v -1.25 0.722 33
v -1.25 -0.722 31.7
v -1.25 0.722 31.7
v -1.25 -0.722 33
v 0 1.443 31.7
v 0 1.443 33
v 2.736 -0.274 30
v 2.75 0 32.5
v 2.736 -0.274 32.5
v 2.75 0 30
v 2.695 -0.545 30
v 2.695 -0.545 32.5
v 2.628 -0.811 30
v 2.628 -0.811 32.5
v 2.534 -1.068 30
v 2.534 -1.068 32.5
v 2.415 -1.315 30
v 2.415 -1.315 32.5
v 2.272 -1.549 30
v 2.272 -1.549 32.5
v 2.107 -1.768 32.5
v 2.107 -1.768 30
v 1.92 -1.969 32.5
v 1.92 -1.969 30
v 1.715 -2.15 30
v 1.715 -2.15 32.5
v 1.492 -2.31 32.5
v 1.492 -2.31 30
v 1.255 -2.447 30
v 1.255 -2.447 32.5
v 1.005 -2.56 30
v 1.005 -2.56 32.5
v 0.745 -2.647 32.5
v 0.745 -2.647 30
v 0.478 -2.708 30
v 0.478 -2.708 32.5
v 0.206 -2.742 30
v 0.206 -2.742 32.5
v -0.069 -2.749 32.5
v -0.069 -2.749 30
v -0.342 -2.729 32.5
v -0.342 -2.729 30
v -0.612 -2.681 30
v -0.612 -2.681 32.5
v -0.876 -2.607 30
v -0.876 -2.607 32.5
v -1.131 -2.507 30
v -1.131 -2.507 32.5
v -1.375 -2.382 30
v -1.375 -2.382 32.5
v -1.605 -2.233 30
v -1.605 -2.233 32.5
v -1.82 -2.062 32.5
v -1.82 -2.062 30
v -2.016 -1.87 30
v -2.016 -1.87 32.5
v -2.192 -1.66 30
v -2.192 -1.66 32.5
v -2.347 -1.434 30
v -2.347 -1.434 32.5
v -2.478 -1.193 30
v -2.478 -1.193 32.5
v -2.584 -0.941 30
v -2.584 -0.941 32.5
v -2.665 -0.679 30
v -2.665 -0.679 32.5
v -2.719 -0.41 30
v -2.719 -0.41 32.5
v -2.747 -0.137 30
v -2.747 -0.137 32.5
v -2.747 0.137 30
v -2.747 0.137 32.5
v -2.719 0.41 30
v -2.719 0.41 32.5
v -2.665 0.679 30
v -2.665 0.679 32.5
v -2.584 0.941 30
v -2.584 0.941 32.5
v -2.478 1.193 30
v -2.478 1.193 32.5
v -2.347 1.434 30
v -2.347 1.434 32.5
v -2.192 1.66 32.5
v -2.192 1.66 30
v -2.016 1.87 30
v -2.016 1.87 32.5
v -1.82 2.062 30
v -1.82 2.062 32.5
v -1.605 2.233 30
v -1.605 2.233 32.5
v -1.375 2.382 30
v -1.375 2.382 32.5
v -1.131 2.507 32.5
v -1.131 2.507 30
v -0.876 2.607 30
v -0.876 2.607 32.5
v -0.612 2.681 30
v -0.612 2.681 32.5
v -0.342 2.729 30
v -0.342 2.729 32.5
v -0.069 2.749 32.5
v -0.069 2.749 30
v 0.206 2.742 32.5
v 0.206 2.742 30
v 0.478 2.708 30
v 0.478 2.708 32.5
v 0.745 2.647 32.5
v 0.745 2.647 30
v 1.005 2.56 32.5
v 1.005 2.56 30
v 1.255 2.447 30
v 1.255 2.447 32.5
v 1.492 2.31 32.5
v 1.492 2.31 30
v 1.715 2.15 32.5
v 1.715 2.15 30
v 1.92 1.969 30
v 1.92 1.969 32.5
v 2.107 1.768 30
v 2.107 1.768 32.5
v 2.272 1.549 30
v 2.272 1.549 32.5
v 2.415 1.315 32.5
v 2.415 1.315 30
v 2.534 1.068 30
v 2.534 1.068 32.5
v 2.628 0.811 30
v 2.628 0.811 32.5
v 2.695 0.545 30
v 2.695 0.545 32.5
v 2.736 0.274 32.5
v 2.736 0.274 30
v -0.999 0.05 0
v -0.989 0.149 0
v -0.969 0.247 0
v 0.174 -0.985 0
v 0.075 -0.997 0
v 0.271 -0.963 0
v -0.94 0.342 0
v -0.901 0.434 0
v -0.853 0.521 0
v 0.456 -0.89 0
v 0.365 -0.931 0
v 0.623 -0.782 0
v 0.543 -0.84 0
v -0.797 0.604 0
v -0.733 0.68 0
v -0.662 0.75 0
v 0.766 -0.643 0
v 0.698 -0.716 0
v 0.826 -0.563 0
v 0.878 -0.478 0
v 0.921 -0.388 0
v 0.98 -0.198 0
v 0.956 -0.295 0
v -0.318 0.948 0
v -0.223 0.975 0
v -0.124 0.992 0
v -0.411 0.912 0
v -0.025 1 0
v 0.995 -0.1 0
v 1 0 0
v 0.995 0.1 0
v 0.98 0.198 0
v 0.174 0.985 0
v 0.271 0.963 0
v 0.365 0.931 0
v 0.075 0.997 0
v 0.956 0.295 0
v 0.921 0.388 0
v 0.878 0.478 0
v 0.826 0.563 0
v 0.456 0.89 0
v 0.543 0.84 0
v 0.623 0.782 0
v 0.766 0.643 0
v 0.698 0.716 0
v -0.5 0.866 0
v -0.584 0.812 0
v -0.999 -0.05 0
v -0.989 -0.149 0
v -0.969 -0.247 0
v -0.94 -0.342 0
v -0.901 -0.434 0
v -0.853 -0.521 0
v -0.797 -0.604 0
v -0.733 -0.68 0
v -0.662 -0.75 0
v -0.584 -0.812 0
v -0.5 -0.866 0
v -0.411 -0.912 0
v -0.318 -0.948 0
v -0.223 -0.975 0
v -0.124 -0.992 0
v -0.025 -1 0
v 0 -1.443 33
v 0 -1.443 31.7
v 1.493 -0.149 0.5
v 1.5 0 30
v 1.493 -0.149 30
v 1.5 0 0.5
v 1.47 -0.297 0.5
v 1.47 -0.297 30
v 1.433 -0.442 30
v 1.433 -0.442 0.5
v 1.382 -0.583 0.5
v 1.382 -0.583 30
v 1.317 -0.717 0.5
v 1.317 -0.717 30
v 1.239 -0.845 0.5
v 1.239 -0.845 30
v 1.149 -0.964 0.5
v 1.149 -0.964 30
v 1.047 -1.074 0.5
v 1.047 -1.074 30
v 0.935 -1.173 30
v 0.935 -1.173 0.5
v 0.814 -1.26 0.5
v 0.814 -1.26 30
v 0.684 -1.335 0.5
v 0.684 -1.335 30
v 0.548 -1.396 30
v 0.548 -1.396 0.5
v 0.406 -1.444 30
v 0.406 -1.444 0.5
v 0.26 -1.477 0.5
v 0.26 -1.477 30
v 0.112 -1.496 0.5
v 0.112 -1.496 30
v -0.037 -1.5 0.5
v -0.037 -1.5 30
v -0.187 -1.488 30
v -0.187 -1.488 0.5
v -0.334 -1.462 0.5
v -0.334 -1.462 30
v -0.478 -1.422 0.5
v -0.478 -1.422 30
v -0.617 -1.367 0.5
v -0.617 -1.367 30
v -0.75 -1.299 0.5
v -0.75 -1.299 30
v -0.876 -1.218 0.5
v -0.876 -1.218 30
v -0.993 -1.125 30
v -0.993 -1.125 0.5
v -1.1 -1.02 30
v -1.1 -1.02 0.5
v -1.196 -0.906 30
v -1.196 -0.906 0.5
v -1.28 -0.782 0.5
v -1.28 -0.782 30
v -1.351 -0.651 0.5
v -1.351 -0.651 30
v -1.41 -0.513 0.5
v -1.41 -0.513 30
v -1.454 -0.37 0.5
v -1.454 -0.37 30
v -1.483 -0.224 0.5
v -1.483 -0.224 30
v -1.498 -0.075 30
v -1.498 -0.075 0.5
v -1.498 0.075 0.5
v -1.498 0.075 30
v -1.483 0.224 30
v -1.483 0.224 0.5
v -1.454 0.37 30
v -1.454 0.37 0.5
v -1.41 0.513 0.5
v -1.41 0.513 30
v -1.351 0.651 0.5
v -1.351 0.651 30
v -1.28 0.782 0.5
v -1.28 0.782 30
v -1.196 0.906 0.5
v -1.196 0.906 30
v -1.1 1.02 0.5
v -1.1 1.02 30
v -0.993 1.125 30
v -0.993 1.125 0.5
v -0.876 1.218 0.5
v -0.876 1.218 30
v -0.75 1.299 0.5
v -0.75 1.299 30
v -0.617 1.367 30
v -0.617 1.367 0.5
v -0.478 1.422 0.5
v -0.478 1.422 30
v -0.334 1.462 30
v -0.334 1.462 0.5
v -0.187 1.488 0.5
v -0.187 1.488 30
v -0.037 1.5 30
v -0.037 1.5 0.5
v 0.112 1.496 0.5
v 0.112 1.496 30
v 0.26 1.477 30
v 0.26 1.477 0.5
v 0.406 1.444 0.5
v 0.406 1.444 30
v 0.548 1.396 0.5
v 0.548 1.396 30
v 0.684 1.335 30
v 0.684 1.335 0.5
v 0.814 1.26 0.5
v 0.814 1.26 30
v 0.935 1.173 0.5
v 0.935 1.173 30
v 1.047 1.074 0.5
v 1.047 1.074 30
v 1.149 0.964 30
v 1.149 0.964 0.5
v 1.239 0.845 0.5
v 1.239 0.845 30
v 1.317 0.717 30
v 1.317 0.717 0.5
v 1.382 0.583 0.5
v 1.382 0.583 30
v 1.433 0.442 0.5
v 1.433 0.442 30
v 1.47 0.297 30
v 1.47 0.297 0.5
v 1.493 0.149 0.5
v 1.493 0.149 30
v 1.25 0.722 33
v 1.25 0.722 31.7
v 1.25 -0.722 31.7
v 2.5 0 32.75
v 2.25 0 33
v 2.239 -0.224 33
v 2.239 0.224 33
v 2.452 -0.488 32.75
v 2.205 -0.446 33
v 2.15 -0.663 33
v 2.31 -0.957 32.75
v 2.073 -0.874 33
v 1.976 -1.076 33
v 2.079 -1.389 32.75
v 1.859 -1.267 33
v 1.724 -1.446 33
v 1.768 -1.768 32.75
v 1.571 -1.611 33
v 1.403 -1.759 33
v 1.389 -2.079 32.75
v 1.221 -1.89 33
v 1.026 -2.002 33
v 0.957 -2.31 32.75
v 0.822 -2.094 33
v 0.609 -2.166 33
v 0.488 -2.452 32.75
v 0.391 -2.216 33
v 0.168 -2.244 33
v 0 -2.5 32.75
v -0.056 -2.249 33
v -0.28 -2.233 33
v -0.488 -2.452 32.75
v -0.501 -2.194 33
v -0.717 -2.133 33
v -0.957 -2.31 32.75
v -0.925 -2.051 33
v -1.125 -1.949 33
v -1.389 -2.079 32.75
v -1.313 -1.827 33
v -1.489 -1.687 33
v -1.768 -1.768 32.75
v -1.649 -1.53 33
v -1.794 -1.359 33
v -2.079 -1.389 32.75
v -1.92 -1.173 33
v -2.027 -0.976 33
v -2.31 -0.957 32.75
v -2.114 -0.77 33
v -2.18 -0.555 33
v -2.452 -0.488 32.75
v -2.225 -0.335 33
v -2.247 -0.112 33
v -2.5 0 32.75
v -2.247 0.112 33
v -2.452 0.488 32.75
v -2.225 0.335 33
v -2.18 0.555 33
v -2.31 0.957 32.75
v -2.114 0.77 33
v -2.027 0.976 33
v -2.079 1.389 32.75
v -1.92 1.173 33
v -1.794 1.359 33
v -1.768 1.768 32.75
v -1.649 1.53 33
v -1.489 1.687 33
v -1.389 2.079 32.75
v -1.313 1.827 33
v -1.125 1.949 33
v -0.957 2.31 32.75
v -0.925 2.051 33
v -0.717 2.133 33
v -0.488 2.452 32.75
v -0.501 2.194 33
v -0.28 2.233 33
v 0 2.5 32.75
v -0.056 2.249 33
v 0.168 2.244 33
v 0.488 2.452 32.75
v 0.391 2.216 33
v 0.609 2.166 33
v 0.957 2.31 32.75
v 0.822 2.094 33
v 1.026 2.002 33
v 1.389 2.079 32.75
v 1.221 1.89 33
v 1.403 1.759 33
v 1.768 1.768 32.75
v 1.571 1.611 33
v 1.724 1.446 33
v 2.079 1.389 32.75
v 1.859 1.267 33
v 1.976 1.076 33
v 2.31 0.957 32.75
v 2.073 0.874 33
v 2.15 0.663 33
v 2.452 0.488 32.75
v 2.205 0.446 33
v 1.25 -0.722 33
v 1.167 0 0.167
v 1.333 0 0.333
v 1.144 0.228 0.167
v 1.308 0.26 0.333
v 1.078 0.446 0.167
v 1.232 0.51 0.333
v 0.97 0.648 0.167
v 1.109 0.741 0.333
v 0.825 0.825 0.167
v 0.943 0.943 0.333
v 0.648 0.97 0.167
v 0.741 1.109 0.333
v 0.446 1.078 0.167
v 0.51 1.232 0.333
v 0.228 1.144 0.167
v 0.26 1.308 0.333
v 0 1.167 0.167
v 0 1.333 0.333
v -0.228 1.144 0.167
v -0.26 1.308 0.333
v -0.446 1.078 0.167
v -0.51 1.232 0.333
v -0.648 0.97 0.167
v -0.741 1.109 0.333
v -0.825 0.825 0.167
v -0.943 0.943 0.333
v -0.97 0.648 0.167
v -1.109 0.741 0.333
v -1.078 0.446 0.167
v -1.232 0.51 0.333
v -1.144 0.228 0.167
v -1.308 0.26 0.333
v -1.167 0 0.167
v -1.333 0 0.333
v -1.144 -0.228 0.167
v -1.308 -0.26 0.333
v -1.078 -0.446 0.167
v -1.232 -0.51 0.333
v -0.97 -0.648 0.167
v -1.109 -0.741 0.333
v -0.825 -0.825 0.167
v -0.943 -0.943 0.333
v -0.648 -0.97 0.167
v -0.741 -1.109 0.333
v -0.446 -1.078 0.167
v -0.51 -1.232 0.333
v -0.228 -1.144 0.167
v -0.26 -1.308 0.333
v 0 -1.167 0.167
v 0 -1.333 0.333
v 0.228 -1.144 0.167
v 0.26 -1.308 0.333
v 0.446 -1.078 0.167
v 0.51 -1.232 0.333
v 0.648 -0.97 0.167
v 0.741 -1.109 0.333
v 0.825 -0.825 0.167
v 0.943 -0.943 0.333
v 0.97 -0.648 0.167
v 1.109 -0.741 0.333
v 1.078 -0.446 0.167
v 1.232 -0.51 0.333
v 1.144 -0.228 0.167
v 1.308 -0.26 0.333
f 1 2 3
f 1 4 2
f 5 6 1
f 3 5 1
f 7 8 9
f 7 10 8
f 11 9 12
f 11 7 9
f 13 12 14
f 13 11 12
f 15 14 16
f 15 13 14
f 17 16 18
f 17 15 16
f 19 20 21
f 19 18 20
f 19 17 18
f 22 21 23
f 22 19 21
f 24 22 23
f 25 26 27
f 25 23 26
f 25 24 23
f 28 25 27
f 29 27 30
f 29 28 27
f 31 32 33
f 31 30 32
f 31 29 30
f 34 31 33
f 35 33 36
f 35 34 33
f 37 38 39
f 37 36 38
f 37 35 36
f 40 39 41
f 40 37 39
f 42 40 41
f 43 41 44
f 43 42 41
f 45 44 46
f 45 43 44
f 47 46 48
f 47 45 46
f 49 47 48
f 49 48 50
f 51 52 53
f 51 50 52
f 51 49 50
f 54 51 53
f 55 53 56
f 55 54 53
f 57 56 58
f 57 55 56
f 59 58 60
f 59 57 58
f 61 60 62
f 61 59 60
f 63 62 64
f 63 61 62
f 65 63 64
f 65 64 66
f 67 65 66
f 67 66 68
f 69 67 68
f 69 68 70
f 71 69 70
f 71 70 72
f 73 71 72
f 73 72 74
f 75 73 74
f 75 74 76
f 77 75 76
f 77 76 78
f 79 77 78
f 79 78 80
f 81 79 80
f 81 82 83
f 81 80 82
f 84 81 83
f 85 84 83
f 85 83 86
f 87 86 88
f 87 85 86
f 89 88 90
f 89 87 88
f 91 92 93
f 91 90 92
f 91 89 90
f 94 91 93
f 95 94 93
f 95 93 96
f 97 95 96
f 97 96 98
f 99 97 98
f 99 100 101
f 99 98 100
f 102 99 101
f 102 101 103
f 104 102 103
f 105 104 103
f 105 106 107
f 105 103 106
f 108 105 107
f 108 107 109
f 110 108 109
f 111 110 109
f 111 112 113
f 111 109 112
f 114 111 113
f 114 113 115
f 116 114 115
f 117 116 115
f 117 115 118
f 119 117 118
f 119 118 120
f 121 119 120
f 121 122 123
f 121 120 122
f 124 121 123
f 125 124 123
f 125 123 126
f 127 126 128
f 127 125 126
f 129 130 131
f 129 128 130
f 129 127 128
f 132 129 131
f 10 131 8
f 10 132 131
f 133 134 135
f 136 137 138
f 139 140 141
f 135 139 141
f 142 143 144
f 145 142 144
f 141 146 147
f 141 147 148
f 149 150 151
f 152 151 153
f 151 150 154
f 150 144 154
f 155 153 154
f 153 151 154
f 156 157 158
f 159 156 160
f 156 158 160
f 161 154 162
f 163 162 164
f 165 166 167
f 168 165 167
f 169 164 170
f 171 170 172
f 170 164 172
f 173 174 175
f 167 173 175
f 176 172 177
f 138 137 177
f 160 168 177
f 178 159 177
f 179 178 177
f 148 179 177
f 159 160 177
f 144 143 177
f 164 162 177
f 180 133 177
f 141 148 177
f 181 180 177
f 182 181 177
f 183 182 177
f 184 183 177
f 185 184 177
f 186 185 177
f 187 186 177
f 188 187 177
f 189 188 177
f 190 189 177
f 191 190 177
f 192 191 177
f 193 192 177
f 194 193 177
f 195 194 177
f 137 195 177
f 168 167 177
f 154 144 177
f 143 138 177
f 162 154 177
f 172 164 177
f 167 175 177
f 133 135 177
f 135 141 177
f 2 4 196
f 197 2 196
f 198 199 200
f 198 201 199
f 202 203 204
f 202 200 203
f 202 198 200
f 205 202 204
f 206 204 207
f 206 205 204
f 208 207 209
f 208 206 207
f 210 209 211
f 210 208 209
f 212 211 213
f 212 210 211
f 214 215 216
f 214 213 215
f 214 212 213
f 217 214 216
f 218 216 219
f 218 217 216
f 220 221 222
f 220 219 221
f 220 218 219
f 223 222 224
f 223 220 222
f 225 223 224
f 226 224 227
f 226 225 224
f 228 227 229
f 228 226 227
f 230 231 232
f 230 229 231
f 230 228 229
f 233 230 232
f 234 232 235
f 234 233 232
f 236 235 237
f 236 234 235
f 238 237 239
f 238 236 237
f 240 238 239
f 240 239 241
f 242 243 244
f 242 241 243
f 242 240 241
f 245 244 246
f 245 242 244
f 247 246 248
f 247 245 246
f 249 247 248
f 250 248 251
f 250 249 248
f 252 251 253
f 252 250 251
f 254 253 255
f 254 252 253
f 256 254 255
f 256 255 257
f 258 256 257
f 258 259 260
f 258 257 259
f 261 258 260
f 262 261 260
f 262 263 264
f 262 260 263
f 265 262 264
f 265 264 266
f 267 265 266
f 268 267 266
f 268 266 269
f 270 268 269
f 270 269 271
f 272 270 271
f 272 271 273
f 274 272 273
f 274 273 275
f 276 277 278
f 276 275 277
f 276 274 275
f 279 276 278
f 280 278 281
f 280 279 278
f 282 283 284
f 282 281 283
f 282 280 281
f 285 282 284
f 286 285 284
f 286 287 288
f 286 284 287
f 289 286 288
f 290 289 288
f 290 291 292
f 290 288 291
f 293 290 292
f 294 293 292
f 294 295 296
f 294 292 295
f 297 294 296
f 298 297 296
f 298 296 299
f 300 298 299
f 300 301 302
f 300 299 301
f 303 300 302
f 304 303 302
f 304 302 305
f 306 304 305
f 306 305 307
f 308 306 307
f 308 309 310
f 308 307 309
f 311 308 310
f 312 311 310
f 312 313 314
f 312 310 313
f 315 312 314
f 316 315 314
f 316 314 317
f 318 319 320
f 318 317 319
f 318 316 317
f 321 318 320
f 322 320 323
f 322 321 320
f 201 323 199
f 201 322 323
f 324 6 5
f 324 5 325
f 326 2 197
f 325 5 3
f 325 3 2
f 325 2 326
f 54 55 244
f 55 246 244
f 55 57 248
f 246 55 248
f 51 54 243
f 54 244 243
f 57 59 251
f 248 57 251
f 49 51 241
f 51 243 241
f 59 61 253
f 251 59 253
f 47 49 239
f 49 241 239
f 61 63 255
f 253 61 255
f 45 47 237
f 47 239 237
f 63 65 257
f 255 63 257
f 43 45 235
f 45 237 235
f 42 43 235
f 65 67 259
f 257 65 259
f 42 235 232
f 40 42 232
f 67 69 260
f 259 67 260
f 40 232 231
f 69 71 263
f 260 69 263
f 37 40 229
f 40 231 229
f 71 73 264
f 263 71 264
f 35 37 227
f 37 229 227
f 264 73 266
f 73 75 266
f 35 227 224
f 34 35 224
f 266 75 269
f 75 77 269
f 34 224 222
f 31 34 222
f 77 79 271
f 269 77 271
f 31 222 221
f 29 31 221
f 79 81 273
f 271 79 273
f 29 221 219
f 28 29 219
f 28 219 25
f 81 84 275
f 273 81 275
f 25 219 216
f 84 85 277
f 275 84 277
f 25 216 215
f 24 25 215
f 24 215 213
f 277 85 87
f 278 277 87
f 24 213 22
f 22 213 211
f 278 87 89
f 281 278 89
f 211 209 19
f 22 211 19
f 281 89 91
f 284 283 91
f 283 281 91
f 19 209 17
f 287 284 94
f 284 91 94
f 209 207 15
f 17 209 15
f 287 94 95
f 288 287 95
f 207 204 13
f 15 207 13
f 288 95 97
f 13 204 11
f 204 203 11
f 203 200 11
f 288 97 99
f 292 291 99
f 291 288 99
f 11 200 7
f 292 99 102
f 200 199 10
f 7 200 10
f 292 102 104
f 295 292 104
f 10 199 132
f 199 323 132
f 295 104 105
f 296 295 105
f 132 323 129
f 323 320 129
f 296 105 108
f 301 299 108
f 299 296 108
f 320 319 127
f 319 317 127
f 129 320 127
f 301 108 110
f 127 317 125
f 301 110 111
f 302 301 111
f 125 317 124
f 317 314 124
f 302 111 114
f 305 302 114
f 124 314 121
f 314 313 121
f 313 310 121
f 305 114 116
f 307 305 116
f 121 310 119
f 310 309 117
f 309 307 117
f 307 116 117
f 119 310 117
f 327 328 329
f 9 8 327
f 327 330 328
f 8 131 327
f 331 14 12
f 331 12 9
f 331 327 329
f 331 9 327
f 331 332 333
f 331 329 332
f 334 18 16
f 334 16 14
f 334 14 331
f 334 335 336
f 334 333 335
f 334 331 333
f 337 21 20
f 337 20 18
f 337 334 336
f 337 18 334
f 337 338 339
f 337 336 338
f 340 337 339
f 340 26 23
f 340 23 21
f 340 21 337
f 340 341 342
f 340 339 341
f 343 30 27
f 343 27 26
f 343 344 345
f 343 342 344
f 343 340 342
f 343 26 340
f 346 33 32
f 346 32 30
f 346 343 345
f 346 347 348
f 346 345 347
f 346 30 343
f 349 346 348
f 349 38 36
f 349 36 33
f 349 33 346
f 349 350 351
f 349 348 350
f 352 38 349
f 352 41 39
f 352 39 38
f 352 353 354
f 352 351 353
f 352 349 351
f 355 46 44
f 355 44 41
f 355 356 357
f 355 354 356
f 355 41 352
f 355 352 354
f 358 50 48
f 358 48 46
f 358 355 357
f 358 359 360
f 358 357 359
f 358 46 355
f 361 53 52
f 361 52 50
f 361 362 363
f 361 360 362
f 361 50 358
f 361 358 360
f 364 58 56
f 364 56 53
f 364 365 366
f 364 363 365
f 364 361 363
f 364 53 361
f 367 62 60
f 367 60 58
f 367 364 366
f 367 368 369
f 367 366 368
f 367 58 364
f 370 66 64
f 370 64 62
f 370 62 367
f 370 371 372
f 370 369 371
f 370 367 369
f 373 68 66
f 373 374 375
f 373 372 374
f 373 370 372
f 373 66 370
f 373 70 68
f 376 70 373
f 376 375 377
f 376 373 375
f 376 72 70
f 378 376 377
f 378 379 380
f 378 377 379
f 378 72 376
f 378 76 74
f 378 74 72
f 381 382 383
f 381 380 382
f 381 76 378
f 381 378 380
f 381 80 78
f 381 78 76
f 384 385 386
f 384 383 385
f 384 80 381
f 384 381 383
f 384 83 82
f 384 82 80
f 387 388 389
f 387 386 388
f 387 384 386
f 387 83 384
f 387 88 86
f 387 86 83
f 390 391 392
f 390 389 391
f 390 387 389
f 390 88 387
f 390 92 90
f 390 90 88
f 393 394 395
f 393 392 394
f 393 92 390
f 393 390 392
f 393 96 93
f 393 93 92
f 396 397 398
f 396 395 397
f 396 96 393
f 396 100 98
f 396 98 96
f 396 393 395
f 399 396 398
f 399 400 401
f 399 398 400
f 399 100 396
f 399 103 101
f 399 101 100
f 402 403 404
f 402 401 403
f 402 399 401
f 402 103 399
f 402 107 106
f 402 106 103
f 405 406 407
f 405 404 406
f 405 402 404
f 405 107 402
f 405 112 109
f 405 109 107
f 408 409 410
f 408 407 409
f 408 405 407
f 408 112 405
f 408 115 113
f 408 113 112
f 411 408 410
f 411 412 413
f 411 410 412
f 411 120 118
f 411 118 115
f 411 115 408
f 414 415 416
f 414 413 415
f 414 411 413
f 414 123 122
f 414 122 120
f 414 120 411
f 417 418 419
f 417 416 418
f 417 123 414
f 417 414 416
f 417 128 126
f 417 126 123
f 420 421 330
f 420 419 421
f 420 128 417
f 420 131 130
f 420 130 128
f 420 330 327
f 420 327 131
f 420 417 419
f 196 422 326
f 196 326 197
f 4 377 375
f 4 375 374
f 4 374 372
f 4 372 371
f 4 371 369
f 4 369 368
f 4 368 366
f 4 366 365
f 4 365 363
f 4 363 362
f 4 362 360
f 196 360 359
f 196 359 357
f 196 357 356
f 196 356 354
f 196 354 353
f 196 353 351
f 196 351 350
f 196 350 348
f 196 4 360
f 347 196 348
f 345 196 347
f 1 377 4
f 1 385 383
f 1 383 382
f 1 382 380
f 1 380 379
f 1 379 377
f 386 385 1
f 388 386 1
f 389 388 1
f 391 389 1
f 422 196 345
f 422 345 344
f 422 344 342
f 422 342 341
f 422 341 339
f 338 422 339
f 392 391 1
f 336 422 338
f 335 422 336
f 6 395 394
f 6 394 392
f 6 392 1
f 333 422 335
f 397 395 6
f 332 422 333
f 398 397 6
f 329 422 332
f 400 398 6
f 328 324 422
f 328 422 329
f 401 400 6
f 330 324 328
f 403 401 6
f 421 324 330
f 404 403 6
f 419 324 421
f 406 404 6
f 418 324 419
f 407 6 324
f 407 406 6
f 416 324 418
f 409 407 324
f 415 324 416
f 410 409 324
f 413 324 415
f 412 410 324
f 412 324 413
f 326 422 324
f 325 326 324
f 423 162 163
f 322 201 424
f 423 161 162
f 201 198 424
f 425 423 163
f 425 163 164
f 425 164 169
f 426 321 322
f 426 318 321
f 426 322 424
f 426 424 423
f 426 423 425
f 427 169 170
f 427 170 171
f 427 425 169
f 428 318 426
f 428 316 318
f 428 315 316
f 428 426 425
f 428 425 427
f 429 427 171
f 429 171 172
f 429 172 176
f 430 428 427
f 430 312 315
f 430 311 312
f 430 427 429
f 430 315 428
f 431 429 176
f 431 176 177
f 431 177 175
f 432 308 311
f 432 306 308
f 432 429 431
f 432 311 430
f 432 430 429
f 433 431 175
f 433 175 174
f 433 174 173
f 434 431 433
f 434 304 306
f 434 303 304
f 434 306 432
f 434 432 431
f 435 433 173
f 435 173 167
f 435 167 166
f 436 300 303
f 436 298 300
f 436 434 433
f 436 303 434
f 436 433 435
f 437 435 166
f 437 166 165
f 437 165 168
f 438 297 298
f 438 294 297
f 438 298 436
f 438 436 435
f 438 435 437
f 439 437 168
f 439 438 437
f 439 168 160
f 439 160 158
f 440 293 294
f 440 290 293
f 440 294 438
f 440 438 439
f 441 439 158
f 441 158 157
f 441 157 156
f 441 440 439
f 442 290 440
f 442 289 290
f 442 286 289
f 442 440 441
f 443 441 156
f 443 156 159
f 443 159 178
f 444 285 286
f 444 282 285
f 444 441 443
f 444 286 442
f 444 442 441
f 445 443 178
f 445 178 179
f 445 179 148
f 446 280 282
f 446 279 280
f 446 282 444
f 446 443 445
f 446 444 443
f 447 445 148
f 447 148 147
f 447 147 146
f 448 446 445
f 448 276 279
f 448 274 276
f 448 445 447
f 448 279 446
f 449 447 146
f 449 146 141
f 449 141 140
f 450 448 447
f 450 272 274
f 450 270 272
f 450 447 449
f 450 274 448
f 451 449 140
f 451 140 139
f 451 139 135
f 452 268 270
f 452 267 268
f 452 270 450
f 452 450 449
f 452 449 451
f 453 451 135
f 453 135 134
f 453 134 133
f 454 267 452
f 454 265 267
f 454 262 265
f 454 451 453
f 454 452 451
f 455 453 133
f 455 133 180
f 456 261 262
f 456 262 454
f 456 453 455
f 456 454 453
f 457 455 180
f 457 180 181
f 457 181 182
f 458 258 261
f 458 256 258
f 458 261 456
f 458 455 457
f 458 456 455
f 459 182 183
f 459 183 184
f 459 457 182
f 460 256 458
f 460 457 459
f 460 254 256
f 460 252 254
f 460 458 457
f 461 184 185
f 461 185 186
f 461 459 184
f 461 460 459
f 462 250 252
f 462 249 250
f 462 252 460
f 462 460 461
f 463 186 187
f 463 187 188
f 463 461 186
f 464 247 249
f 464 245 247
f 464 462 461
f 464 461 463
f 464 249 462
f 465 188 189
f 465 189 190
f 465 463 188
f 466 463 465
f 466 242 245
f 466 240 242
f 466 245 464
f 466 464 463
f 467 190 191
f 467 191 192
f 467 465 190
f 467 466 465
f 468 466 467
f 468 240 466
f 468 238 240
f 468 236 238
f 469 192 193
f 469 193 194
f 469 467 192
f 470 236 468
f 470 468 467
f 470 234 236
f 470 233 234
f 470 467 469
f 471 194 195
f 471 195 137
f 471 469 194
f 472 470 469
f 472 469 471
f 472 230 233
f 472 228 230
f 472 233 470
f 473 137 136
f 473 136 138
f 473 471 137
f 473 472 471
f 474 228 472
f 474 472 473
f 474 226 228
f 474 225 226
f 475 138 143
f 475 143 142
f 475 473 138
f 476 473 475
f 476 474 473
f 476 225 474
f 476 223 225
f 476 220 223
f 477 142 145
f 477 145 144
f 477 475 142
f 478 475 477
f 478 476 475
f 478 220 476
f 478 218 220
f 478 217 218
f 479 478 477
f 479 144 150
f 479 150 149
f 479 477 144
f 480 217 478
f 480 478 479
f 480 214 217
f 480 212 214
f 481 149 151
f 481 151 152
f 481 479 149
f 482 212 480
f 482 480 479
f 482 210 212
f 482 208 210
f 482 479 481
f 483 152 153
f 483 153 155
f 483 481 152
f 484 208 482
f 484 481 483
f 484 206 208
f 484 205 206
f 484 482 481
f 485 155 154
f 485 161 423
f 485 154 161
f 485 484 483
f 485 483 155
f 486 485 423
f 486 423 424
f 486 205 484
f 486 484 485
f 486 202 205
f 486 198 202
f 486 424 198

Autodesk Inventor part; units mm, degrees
ref_plane "YZ Plane" through (0, 0, 0) normal (1, 0, 0) x (0, 1, 0)
ref_plane "XZ Plane" through (0, 0, 0) normal (0, 1, 0) x (-1, 0, 0)
ref_plane "XY Plane" through (0, 0, 0) normal (0, 0, 1) x (1, 0, 0)
sketch "Sketch1" plane through (0, 0, 0) normal (0, 0, 1) x (1, 0, 0)
  circle A0 centre (0, 0) radius 1.5
  dimension "Diameter" = 3
extrude "Extrusion1" add sketch "Sketch1" along normal blind 30
sketch "Sketch2" plane through (0, 0, 30) normal (0, 0, 1) x (1, 0, 0)
  circle A0 centre (0, 0) radius 1.5 projected
  circle A1 centre (0, 0) radius 2.75
  dimension "Kopdiameter" = 5.5
extrude "Extrusion2" add sketch "Sketch2" along normal blind 3 contours A0 | A1
sketch "Sketch3" plane through (0, 0, 33) normal (0, 0, 1) x (1, 0, 0)
  circle A0 centre (0, 0) radius 2.75 projected
  circle A1 centre (0, 0) radius 1.4434 construction
  line L0 (0, 1.4434) -> (1.25, 0.7217)
  line L1 (1.25, -0.7217) -> (1.25, 0.7217)
  line L2 (0, 1.4434) -> (-1.25, 0.7217)
  line L3 (-1.25, -0.7217) -> (-1.25, 0.7217)
  line L4 (-1.25, -0.7217) -> (0, -1.4434)
  line L5 (1.25, -0.7217) -> (0, -1.4434)
  dimension "Binnenzeskant" = 2.5
extrude "Extrusion3" cut sketch "Sketch3" against normal blind 1.3 contours L0 L1 L5 L4 L3 L2
thread "Thread1" size "M3x0.5" class "4g6g" standard "ISO Metric profile" full length
chamfer "Chaflán2" distance 0.5 angle 45 2 edges at (-2.75, 0, 33) (-1.5, 0, 0)
equation "\"d9\" = Draadlengte"
equation "\"Draadlengte\" = 24.75"
equation "\"Sizes\" = Diameter"
equation "\"Schroefdraad\" = Sizes"
properties part number "tornillo allen m3x30" material "Grade 8.8"
